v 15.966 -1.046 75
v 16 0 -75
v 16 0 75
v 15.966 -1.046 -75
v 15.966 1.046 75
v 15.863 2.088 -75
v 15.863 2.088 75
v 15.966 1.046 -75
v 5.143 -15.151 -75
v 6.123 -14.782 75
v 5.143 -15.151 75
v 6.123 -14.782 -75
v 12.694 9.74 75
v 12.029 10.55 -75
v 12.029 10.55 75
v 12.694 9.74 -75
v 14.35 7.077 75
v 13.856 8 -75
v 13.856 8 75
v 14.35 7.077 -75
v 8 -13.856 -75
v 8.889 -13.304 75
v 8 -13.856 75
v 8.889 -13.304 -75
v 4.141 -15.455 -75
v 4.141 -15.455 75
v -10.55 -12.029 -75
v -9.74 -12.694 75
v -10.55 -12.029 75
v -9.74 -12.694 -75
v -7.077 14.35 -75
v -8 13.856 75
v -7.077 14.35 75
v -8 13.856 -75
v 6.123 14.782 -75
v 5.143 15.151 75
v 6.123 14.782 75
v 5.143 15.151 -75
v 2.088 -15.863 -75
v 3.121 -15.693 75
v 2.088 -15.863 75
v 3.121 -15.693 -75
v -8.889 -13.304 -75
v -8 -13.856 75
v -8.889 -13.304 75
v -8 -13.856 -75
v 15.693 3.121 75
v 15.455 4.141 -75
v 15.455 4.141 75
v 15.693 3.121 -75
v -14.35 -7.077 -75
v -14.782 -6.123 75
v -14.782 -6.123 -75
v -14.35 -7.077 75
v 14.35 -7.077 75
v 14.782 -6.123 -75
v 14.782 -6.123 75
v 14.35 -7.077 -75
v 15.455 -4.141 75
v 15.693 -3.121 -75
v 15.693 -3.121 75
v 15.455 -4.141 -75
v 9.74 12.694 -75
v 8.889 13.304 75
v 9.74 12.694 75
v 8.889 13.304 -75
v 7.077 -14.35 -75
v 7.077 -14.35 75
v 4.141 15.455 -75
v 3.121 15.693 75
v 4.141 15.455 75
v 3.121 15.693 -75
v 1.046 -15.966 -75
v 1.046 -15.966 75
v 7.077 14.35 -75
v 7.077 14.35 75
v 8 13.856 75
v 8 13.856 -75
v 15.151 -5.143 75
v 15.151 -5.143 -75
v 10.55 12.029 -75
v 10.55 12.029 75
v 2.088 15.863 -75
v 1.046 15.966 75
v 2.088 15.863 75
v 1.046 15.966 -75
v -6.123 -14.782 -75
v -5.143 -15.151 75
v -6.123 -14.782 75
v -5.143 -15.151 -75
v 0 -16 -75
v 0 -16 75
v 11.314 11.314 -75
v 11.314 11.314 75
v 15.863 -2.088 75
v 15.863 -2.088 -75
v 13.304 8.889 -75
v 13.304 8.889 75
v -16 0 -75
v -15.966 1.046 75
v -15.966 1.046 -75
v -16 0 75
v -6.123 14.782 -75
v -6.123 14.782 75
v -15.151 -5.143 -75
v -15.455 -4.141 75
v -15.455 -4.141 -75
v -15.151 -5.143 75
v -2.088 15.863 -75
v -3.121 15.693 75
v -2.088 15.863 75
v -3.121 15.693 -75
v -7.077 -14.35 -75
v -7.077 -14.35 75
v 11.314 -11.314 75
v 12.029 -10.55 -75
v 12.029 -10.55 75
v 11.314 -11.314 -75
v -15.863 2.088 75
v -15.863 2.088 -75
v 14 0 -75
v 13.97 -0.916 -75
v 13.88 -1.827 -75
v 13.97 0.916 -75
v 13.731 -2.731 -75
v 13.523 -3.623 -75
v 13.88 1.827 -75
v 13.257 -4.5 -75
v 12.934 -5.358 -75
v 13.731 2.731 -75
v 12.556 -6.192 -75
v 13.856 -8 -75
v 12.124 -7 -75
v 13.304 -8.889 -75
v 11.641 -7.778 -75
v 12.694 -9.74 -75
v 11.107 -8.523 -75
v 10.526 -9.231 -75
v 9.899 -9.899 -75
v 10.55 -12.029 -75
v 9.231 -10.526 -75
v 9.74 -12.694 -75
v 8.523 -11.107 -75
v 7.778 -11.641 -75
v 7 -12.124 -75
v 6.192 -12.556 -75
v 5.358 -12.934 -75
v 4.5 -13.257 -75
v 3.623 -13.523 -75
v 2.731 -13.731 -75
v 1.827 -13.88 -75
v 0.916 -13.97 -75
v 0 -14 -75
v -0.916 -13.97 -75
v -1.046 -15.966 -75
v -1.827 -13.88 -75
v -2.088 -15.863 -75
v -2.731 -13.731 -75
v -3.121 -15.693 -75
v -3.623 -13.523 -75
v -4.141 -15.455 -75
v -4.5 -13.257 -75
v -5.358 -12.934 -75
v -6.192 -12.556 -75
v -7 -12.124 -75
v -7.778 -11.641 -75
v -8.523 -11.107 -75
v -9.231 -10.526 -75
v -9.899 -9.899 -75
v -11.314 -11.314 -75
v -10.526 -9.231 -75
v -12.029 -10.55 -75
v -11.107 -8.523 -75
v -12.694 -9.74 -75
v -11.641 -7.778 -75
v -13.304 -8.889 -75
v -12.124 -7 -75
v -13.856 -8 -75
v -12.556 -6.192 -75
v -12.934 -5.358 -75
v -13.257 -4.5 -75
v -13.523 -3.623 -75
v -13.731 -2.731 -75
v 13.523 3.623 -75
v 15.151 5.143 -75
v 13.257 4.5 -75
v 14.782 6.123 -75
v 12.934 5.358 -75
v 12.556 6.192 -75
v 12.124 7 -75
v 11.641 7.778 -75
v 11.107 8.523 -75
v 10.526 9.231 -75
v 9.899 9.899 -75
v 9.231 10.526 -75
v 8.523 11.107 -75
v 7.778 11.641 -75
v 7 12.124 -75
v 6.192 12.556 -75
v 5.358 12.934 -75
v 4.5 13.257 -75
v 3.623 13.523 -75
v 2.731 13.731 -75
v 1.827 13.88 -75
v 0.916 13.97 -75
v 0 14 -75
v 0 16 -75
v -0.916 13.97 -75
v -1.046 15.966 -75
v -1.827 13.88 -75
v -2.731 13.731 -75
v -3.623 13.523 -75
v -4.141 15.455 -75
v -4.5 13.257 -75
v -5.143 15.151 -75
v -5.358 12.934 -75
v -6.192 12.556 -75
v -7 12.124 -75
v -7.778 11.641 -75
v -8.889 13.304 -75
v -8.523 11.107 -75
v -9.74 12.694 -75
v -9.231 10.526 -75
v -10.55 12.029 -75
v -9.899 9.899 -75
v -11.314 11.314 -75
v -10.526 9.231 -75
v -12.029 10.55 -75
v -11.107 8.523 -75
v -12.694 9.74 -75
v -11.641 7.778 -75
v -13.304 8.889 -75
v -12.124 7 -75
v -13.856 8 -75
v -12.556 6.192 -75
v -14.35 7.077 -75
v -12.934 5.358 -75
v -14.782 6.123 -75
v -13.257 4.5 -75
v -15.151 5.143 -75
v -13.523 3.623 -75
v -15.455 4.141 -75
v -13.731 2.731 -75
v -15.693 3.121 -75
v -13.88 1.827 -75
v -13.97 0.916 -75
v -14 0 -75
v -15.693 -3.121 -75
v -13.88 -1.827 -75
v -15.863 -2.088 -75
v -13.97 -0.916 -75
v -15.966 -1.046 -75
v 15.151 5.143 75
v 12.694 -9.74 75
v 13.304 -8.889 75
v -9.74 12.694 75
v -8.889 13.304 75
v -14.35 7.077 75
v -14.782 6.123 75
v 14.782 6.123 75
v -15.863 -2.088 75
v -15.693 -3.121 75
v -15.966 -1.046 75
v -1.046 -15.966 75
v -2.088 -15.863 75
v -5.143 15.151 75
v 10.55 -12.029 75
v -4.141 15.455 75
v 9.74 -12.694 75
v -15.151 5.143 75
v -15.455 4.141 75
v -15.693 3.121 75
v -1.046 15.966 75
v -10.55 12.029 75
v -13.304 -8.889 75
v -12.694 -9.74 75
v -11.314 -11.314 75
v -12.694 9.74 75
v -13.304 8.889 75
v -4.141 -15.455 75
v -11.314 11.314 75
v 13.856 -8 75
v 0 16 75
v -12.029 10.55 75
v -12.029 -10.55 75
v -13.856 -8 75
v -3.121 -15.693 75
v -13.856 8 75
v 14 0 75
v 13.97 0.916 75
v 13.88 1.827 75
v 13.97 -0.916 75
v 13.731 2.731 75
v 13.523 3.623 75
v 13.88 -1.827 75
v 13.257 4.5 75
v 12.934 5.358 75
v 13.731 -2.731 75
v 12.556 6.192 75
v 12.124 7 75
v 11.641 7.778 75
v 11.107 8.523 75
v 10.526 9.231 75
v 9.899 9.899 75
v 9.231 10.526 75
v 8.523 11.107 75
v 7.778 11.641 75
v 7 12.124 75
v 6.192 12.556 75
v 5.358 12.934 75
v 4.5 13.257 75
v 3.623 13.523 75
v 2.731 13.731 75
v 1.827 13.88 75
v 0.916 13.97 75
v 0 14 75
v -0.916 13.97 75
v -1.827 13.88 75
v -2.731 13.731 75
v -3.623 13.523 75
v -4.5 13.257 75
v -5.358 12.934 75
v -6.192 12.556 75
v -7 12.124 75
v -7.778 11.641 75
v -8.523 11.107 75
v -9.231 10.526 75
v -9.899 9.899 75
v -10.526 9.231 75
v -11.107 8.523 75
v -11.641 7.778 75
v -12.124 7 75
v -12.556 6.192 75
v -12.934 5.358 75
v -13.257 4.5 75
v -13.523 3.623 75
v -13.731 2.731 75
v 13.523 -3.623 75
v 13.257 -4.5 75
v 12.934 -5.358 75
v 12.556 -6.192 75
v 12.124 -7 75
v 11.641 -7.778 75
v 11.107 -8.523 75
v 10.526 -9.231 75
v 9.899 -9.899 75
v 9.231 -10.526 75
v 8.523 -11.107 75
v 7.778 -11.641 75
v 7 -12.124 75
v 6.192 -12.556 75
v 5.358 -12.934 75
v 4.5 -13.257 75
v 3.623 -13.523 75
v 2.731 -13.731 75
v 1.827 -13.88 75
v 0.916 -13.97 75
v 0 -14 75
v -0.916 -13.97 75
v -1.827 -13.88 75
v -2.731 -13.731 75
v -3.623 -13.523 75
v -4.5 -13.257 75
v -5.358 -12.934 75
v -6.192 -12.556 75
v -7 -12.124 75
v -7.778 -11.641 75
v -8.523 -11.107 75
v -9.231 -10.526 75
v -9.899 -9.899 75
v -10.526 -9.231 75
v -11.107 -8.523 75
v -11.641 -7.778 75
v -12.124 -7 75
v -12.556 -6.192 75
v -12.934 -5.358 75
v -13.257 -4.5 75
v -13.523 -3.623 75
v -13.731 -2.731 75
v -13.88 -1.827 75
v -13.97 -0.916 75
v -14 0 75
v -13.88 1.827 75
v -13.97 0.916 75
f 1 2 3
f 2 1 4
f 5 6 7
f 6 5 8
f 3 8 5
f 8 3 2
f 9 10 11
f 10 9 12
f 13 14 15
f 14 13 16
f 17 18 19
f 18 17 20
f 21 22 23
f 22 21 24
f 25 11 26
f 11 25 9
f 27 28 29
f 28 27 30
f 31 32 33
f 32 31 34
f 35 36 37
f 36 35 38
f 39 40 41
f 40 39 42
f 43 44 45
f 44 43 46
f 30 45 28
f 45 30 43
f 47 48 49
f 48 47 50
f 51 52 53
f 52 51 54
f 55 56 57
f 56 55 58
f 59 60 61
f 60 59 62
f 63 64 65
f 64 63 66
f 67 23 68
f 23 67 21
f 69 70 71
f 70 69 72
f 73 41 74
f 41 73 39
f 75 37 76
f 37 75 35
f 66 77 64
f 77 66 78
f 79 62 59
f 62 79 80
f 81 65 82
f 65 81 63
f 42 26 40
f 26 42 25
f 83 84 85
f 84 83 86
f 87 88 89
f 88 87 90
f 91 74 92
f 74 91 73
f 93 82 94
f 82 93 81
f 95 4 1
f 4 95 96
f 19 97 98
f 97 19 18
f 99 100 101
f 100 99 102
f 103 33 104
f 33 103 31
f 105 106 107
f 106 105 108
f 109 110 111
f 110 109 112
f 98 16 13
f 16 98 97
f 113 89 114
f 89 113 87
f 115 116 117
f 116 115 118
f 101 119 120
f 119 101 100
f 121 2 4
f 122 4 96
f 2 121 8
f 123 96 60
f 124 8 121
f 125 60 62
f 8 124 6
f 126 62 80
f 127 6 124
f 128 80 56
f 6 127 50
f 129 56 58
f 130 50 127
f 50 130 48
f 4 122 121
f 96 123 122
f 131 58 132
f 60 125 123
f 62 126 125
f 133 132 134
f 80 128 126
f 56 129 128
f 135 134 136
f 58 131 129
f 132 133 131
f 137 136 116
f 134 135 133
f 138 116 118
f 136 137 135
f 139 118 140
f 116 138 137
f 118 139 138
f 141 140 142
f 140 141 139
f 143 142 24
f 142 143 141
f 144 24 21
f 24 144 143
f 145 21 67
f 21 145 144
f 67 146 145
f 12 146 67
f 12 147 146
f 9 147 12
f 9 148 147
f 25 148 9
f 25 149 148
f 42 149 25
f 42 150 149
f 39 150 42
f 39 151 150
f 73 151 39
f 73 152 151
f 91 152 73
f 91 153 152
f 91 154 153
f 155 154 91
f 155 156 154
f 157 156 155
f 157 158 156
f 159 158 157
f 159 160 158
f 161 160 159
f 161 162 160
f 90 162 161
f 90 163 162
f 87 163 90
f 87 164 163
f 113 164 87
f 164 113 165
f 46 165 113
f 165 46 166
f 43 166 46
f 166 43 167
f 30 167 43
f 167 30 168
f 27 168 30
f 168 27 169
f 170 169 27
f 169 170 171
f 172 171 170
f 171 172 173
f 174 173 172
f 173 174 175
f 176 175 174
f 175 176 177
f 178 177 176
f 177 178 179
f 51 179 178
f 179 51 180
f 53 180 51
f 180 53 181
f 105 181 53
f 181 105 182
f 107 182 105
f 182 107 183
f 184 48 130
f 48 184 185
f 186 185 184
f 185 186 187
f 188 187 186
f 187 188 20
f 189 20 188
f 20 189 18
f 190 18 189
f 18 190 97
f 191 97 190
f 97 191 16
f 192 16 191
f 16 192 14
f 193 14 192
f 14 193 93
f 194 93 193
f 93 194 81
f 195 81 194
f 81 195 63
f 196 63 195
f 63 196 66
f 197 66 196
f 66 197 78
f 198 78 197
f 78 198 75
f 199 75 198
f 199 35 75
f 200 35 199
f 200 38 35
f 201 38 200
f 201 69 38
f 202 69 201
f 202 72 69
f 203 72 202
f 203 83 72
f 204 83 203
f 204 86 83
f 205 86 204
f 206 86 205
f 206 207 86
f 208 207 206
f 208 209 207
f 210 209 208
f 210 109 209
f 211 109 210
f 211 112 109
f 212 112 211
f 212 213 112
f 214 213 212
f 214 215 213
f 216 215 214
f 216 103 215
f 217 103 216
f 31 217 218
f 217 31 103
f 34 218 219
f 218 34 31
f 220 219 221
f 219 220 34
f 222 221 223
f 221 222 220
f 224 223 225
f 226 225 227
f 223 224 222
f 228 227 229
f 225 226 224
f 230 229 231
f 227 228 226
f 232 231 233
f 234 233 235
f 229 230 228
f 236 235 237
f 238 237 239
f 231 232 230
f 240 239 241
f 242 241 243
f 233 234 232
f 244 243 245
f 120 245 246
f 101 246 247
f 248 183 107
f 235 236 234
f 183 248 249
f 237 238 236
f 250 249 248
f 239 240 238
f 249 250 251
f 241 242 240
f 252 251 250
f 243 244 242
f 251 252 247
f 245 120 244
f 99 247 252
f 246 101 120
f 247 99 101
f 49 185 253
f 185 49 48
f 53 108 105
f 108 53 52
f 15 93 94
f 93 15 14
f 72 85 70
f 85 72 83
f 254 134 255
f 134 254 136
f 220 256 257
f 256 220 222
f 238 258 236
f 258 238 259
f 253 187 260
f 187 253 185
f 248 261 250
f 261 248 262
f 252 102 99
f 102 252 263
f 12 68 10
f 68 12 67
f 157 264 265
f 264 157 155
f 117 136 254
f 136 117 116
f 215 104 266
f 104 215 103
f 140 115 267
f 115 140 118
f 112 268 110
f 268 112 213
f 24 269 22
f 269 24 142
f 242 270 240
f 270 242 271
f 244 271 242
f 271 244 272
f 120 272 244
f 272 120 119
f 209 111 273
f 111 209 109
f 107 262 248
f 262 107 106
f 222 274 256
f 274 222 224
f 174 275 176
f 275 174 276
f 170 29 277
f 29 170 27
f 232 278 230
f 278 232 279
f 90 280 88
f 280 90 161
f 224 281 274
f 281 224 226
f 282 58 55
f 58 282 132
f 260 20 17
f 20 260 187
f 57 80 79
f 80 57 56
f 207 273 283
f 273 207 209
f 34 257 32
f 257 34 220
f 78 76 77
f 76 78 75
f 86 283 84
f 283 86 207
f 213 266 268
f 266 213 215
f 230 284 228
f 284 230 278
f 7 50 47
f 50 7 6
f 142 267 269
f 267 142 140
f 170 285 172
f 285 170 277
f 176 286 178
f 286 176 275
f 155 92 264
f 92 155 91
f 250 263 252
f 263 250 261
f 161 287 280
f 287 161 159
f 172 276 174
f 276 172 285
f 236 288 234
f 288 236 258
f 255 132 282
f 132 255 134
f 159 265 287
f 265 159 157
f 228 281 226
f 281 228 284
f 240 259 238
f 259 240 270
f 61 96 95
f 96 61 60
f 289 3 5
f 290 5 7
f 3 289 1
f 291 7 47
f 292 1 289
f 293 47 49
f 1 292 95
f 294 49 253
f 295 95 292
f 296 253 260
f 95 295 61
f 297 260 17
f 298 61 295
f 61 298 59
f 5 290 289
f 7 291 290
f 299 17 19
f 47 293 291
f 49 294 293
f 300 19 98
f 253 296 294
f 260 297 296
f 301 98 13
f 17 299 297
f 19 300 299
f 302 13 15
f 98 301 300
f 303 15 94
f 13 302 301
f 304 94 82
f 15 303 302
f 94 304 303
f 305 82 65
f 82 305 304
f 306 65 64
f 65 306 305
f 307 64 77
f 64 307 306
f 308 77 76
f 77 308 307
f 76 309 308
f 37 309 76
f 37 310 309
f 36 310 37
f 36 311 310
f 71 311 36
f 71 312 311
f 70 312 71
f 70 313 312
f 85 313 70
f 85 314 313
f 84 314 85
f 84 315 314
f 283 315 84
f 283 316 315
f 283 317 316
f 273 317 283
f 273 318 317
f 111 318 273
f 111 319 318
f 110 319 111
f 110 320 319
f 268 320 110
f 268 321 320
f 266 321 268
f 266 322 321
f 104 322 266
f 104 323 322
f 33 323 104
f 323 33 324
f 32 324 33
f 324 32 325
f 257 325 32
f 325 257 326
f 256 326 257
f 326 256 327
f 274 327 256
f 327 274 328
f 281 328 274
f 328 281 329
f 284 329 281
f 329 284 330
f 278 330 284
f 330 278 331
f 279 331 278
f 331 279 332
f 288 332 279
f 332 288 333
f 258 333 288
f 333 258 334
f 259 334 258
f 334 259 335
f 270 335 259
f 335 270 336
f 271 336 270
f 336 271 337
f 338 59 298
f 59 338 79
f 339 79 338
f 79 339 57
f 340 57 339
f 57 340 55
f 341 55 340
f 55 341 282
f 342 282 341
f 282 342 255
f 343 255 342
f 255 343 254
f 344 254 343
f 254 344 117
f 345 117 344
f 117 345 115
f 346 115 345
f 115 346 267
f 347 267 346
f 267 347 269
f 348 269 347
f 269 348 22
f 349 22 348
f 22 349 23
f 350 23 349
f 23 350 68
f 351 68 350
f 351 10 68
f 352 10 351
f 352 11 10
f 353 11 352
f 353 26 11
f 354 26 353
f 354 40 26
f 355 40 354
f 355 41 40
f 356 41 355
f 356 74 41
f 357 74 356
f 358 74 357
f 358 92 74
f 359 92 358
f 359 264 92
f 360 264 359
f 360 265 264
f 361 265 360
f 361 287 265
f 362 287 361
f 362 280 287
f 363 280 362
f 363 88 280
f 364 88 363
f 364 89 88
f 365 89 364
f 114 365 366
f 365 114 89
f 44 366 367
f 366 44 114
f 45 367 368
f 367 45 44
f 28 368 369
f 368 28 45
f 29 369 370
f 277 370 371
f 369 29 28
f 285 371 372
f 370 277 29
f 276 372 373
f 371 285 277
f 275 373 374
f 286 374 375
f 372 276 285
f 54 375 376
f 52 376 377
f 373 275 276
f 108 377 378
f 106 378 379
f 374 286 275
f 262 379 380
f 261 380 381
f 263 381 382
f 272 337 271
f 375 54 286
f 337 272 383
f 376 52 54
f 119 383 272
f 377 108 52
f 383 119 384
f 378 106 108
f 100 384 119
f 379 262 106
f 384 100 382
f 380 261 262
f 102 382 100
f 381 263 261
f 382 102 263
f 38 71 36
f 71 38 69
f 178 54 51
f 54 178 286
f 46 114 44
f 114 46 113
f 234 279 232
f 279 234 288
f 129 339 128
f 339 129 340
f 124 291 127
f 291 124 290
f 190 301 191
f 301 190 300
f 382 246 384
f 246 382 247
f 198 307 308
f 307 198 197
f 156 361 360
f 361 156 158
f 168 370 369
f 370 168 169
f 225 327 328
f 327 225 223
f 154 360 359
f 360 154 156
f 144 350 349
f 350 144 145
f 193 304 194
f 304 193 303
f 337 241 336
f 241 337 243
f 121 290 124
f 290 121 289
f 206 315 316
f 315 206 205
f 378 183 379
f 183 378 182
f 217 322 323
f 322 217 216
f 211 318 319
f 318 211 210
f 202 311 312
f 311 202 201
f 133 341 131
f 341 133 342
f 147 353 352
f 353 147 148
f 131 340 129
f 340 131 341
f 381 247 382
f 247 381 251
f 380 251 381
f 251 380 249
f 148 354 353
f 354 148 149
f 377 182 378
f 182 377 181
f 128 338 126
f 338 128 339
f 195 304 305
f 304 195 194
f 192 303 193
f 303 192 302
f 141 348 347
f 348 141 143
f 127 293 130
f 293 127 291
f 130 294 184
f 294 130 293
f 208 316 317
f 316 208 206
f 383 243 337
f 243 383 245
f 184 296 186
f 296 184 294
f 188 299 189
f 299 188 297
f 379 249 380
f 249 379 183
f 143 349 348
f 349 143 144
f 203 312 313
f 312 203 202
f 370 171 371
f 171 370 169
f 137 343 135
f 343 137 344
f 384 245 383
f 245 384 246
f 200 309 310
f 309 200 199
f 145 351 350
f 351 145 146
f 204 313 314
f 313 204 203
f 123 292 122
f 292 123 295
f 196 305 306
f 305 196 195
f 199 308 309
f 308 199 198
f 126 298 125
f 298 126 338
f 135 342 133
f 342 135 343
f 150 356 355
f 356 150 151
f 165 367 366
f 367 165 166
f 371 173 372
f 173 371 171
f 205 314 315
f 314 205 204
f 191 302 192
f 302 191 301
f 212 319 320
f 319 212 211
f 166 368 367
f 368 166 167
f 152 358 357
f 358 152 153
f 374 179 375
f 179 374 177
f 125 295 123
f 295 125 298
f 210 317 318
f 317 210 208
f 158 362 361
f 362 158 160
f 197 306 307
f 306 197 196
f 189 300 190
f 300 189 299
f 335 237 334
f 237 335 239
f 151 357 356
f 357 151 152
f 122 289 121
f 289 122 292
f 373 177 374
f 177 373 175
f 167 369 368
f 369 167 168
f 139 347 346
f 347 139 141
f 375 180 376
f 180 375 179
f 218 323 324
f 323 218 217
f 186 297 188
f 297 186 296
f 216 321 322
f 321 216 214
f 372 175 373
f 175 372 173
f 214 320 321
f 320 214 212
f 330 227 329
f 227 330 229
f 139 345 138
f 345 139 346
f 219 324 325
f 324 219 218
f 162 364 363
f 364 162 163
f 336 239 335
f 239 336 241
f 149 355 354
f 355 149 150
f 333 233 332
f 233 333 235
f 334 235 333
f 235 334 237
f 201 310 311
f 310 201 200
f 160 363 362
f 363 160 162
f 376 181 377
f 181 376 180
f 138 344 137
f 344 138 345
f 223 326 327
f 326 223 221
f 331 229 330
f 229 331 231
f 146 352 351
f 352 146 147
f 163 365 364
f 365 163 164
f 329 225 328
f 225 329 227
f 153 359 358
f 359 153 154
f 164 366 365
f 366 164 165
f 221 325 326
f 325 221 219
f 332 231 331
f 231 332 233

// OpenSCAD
$fn=96;

module ht_pipe(od=32, length=150, wall=2.0) {
    difference() {
        cylinder(h=length, d=od, center=true);
        cylinder(h=length+0.2, d=od-2*wall, center=true);
    }
}

ht_pipe(od=32, length=150, wall=2.0);
